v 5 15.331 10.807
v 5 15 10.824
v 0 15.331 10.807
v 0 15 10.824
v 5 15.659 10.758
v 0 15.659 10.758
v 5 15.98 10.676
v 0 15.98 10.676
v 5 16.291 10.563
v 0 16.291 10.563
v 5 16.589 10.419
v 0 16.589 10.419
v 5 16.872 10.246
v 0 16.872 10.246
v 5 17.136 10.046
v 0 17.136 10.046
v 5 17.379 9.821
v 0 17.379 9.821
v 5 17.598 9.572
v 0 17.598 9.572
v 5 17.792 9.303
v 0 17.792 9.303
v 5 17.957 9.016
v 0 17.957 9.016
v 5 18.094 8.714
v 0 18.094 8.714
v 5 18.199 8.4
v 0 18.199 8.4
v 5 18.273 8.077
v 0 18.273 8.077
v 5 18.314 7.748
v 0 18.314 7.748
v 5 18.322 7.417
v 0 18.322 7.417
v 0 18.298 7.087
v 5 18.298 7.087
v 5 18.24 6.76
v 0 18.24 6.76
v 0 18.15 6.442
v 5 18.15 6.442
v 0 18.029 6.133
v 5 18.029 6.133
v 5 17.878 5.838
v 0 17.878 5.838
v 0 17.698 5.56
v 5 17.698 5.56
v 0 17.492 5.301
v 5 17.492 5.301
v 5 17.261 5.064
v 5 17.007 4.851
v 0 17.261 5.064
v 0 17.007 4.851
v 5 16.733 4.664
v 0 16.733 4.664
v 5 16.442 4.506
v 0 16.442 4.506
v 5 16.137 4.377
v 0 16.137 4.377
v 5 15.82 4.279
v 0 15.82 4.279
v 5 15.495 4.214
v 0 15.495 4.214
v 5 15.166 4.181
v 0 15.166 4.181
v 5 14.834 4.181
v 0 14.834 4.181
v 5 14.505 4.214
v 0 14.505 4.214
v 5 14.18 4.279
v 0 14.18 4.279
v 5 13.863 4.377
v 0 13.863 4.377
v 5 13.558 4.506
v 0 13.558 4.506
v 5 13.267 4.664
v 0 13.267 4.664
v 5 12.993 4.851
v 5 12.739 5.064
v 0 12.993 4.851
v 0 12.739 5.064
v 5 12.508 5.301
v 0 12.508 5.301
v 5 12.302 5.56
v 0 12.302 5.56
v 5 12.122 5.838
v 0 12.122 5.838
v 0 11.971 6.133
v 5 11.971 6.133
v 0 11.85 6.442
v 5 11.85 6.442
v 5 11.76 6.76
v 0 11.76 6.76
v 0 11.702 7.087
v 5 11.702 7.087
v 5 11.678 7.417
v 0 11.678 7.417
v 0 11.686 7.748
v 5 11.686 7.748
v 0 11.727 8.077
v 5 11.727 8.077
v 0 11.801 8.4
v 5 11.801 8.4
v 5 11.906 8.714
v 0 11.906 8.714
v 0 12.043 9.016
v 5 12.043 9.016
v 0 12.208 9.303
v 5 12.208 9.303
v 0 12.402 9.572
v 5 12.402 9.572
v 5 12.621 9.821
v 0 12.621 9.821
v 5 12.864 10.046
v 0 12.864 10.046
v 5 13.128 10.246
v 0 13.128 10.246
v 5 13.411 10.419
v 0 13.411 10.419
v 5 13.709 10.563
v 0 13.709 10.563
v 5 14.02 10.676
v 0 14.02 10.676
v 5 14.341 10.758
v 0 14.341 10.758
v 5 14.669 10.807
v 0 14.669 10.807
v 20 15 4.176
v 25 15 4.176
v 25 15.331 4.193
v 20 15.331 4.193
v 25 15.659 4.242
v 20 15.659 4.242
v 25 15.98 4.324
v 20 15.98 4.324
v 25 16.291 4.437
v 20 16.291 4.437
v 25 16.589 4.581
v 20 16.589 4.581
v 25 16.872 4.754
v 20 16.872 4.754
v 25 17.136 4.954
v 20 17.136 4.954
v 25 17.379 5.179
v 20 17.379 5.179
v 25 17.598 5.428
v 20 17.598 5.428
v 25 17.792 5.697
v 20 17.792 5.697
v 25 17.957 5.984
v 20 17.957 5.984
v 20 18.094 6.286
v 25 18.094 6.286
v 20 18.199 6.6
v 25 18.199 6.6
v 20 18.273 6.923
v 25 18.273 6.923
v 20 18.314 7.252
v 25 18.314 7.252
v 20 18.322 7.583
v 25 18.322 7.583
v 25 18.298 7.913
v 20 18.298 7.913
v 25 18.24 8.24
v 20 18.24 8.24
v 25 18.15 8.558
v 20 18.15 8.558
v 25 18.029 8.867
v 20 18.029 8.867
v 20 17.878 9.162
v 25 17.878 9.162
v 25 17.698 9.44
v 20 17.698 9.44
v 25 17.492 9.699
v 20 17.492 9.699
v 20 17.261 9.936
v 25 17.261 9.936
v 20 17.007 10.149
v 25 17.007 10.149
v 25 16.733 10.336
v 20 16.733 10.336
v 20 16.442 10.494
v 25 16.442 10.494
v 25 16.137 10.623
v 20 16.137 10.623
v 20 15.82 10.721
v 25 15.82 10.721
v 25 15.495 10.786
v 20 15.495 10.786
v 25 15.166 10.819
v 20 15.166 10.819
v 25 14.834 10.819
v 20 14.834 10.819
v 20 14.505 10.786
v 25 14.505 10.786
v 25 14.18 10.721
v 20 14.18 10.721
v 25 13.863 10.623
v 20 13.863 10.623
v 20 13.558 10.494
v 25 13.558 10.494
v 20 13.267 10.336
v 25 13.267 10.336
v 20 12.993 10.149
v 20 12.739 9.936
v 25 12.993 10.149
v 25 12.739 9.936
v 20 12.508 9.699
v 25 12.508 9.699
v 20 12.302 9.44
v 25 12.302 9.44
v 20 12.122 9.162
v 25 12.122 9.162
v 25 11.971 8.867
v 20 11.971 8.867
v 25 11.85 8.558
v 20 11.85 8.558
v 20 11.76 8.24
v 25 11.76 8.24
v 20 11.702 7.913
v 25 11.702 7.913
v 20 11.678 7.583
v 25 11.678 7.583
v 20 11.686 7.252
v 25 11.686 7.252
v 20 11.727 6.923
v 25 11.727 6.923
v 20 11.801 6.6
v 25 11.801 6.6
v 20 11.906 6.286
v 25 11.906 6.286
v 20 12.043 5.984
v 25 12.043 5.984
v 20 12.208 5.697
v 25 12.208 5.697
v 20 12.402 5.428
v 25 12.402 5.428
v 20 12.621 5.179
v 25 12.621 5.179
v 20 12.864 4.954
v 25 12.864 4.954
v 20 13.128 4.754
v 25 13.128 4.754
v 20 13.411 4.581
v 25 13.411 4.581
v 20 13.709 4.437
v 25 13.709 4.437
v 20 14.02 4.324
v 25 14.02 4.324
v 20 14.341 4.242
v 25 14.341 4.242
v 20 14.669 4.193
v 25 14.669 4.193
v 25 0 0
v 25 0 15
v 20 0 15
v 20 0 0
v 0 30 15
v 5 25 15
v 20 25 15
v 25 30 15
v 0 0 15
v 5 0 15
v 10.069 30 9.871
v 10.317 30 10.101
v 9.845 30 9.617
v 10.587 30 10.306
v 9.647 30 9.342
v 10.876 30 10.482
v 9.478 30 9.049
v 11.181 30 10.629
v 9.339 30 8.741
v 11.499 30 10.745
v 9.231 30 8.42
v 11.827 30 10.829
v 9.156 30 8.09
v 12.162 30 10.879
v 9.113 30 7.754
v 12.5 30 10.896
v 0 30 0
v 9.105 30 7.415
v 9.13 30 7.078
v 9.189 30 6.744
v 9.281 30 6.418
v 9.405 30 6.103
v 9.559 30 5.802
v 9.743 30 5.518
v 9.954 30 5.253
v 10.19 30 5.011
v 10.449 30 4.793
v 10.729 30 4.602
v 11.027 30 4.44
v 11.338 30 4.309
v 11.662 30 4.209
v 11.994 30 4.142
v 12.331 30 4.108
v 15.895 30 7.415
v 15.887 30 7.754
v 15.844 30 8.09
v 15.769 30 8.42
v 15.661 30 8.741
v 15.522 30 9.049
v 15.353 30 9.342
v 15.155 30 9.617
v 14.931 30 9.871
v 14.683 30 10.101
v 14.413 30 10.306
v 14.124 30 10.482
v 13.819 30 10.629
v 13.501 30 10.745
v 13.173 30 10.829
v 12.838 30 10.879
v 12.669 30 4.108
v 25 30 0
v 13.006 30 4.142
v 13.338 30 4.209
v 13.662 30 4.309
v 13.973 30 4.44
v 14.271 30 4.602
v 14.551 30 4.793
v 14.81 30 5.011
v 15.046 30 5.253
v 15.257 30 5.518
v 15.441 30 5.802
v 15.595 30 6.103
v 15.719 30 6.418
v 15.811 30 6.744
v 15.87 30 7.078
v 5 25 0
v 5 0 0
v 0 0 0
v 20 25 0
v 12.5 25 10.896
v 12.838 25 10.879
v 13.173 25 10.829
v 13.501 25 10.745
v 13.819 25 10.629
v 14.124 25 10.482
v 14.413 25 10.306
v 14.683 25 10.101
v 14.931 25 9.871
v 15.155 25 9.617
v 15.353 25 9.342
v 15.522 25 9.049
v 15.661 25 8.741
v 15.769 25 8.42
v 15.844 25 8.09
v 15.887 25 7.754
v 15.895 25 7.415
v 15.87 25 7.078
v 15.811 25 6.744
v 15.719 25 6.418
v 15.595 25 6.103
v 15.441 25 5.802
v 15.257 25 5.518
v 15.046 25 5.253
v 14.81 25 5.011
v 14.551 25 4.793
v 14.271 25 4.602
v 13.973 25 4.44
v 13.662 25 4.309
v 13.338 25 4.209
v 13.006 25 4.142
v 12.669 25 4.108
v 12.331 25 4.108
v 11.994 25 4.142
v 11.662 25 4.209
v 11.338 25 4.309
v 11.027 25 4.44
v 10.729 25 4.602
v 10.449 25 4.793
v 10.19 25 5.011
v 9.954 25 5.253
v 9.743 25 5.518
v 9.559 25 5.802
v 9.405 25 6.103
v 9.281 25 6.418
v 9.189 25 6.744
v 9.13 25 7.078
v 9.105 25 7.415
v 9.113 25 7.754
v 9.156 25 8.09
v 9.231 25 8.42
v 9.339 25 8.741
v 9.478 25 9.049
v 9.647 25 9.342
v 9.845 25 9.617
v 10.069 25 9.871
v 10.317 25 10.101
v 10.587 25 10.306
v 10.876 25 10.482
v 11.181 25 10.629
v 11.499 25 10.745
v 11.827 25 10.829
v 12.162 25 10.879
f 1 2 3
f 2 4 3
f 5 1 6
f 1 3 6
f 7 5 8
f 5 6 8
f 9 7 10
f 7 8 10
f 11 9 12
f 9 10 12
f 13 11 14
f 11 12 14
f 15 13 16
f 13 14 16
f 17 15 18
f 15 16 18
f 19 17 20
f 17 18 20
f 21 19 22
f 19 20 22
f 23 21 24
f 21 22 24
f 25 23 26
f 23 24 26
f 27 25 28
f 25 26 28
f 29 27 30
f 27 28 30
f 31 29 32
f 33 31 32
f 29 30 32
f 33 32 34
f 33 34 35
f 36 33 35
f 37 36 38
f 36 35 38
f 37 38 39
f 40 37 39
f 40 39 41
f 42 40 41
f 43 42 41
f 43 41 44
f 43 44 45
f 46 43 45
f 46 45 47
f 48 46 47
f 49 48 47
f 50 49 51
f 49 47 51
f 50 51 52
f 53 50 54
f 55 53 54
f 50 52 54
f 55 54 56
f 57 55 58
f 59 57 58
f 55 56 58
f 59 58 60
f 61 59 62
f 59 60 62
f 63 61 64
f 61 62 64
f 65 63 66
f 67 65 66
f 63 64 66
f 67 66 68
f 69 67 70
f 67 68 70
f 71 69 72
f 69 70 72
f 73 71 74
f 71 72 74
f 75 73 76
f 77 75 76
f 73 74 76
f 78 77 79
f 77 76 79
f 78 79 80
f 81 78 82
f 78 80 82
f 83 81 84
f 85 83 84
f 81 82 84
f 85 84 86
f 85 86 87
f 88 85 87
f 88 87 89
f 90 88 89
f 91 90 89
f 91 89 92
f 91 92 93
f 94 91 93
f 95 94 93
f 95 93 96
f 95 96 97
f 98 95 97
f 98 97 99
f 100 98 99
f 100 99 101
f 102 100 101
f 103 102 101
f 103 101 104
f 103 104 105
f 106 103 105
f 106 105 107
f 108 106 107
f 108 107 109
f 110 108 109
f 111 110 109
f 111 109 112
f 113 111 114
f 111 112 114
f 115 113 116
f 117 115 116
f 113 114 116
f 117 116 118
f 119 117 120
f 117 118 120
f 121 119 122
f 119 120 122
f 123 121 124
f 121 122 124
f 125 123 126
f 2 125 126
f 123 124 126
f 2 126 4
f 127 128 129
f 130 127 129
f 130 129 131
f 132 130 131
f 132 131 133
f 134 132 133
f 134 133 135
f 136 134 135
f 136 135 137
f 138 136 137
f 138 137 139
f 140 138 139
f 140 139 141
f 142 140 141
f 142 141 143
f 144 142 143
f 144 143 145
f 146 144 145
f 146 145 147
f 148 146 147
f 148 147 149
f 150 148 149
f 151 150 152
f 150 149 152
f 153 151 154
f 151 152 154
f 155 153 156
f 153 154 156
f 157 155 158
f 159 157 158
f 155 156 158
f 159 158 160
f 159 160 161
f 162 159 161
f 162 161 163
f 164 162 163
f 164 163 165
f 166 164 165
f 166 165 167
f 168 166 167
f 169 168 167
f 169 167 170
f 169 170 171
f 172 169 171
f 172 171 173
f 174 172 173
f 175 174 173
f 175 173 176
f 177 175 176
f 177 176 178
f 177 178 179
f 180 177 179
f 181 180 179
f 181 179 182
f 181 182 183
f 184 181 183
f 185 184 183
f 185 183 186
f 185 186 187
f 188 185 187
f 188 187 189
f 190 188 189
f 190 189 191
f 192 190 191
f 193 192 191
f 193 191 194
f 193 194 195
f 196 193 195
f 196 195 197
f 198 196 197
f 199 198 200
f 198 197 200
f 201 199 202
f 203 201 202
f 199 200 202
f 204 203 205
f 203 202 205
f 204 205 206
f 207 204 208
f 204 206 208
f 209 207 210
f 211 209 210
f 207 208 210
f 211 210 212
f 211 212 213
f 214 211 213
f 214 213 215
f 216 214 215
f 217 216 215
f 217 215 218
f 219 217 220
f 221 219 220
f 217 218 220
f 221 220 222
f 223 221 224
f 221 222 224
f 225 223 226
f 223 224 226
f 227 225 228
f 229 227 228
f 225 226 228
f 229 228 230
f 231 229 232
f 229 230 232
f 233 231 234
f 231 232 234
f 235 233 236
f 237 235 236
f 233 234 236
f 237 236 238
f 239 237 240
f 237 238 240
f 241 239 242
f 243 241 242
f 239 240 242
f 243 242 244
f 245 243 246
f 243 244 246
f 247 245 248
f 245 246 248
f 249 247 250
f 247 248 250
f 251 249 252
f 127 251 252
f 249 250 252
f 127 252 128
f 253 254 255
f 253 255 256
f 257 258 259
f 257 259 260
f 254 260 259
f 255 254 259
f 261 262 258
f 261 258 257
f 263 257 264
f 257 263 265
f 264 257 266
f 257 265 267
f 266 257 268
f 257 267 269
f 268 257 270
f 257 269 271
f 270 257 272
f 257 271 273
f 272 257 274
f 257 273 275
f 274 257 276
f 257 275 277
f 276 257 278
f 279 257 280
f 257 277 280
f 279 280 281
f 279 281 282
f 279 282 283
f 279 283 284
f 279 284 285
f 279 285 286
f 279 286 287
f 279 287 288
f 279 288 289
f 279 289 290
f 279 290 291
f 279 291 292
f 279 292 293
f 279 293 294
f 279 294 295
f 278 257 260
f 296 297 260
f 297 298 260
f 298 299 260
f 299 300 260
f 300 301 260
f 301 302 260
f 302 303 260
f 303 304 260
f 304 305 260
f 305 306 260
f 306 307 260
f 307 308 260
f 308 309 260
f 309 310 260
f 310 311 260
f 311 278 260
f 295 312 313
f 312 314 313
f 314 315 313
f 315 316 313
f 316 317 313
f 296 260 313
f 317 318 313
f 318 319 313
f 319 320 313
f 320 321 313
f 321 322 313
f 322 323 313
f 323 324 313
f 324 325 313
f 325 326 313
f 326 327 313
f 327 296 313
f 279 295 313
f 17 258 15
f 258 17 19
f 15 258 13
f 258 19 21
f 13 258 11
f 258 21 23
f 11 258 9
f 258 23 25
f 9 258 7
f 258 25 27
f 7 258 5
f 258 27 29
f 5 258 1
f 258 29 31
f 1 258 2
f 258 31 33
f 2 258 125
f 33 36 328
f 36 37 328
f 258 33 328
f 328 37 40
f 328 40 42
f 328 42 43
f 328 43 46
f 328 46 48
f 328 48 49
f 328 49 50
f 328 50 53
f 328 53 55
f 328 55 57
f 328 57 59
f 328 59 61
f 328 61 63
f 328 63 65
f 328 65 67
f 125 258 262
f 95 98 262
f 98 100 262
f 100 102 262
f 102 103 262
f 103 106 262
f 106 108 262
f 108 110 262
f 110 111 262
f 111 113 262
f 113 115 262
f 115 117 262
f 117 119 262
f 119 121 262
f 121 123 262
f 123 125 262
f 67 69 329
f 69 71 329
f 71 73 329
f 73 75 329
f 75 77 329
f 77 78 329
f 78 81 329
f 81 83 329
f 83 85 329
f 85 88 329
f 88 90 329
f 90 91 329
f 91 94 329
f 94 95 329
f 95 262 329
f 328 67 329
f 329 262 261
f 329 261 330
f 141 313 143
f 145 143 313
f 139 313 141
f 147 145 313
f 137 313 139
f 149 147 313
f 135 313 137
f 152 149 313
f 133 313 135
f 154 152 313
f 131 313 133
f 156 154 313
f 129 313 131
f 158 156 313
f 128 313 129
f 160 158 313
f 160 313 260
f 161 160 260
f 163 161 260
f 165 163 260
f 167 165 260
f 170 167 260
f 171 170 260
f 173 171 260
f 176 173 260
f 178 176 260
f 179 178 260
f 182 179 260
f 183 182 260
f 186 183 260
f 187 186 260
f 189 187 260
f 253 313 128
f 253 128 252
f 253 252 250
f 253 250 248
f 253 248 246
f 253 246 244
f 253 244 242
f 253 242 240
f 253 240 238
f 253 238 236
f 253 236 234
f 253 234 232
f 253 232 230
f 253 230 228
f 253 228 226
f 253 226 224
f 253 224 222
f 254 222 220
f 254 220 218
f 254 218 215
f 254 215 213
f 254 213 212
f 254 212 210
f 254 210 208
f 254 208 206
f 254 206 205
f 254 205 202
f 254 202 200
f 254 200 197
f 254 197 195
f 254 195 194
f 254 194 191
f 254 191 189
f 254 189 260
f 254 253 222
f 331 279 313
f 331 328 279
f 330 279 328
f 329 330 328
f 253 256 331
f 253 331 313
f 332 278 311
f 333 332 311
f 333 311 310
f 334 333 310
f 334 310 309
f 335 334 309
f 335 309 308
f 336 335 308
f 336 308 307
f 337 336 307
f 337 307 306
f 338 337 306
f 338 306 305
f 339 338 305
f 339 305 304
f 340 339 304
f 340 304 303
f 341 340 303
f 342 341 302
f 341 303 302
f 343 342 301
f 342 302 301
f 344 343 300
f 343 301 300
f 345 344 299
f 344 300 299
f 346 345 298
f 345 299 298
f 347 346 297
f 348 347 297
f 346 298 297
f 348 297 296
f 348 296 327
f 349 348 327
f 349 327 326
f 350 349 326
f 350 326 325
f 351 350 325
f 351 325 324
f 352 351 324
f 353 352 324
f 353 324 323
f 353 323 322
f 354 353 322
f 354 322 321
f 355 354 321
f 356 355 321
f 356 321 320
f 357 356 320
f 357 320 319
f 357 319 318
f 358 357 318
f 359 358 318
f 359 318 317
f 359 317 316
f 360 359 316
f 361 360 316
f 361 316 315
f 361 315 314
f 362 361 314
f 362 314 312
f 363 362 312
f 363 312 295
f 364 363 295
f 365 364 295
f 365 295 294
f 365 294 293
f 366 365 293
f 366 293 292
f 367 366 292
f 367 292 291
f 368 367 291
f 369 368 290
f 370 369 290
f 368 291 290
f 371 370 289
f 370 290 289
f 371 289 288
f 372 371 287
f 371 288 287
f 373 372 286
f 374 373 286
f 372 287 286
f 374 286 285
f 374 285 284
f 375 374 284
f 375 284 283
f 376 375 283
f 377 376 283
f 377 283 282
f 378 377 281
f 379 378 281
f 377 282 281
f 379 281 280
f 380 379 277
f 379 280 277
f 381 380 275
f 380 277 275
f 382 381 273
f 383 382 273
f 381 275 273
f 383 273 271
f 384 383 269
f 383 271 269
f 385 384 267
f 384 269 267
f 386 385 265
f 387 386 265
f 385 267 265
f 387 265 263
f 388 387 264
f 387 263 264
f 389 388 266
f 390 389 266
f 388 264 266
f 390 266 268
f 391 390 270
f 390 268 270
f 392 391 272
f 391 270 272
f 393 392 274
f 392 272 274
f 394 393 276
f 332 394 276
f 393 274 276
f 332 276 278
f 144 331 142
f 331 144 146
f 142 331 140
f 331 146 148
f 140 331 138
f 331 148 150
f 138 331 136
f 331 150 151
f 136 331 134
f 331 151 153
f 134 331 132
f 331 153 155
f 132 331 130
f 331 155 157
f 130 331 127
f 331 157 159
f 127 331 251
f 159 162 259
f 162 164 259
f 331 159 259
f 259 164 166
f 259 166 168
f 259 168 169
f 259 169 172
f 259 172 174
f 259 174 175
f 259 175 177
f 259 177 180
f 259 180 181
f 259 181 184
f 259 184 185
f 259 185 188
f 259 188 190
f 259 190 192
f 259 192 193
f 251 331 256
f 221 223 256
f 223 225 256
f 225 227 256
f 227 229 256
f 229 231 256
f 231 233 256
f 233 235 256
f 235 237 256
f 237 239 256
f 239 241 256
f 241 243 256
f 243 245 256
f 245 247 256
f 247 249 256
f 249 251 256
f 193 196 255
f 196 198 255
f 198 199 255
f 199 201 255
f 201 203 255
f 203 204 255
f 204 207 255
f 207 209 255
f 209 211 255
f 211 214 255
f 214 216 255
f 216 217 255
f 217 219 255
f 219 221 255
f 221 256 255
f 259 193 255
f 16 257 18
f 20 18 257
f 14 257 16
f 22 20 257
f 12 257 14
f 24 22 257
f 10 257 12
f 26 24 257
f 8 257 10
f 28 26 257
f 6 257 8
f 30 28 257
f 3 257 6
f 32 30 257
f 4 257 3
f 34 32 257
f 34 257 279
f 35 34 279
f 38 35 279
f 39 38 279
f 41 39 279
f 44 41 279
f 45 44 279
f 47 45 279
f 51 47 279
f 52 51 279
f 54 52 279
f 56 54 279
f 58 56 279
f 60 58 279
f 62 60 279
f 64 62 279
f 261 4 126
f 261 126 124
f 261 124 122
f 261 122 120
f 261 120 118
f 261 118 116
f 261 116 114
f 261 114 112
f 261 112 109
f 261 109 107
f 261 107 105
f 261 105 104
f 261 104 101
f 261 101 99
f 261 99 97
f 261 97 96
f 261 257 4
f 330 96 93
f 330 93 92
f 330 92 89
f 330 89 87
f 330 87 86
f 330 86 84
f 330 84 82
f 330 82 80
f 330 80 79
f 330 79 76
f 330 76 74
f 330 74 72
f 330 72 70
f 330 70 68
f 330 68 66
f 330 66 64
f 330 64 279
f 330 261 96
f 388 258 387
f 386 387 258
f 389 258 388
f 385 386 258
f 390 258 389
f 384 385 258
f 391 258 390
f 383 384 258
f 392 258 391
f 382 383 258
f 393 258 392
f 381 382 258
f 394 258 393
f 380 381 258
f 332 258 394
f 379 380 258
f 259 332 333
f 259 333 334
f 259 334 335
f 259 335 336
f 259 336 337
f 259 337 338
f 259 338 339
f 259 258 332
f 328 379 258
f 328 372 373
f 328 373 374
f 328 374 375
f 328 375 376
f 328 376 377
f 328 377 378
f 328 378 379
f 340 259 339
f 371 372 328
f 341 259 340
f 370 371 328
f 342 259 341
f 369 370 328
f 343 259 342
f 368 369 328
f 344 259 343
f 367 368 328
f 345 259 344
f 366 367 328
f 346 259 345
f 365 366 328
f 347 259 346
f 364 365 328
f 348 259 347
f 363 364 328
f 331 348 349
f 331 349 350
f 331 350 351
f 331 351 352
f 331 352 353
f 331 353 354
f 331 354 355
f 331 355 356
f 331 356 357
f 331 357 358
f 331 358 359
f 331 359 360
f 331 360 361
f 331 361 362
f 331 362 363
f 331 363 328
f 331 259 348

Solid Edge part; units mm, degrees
sketch "Sketch1" plane through (0, 0, 0) normal (0, -1, 0) x (1, 0, 0)
  line L0 (0, 0) -> (25, 0)
  line L1 (25, 0) -> (25, 15)
  line L2 (25, 15) -> (0, 15)
  line L3 (0, 15) -> (0, 0)
extrude "Protrusion1" add sketch "Sketch1" against normal blind 30
shell "Thinwall_1" thickness 5 removed faces 3 at (4.4167, 0, 12.65) at (21.0833, 24.7, 15) at (3.9167, 24.7, 0)
hole "Hole_1" at (25, 15, 7.5) direction (-1, 0, 0) diameter 6.647 end up to next thread major 8 thread length 50.8
hole "M8_holes" at (0, 15, 7.5) direction (1, 0, 0) diameter 6.647 end up to next thread major 8 thread length 50.8
hole "Hole_3" at (12.5, 30, 7.5) direction (0, -1, 0) diameter 6.792 end up to next
